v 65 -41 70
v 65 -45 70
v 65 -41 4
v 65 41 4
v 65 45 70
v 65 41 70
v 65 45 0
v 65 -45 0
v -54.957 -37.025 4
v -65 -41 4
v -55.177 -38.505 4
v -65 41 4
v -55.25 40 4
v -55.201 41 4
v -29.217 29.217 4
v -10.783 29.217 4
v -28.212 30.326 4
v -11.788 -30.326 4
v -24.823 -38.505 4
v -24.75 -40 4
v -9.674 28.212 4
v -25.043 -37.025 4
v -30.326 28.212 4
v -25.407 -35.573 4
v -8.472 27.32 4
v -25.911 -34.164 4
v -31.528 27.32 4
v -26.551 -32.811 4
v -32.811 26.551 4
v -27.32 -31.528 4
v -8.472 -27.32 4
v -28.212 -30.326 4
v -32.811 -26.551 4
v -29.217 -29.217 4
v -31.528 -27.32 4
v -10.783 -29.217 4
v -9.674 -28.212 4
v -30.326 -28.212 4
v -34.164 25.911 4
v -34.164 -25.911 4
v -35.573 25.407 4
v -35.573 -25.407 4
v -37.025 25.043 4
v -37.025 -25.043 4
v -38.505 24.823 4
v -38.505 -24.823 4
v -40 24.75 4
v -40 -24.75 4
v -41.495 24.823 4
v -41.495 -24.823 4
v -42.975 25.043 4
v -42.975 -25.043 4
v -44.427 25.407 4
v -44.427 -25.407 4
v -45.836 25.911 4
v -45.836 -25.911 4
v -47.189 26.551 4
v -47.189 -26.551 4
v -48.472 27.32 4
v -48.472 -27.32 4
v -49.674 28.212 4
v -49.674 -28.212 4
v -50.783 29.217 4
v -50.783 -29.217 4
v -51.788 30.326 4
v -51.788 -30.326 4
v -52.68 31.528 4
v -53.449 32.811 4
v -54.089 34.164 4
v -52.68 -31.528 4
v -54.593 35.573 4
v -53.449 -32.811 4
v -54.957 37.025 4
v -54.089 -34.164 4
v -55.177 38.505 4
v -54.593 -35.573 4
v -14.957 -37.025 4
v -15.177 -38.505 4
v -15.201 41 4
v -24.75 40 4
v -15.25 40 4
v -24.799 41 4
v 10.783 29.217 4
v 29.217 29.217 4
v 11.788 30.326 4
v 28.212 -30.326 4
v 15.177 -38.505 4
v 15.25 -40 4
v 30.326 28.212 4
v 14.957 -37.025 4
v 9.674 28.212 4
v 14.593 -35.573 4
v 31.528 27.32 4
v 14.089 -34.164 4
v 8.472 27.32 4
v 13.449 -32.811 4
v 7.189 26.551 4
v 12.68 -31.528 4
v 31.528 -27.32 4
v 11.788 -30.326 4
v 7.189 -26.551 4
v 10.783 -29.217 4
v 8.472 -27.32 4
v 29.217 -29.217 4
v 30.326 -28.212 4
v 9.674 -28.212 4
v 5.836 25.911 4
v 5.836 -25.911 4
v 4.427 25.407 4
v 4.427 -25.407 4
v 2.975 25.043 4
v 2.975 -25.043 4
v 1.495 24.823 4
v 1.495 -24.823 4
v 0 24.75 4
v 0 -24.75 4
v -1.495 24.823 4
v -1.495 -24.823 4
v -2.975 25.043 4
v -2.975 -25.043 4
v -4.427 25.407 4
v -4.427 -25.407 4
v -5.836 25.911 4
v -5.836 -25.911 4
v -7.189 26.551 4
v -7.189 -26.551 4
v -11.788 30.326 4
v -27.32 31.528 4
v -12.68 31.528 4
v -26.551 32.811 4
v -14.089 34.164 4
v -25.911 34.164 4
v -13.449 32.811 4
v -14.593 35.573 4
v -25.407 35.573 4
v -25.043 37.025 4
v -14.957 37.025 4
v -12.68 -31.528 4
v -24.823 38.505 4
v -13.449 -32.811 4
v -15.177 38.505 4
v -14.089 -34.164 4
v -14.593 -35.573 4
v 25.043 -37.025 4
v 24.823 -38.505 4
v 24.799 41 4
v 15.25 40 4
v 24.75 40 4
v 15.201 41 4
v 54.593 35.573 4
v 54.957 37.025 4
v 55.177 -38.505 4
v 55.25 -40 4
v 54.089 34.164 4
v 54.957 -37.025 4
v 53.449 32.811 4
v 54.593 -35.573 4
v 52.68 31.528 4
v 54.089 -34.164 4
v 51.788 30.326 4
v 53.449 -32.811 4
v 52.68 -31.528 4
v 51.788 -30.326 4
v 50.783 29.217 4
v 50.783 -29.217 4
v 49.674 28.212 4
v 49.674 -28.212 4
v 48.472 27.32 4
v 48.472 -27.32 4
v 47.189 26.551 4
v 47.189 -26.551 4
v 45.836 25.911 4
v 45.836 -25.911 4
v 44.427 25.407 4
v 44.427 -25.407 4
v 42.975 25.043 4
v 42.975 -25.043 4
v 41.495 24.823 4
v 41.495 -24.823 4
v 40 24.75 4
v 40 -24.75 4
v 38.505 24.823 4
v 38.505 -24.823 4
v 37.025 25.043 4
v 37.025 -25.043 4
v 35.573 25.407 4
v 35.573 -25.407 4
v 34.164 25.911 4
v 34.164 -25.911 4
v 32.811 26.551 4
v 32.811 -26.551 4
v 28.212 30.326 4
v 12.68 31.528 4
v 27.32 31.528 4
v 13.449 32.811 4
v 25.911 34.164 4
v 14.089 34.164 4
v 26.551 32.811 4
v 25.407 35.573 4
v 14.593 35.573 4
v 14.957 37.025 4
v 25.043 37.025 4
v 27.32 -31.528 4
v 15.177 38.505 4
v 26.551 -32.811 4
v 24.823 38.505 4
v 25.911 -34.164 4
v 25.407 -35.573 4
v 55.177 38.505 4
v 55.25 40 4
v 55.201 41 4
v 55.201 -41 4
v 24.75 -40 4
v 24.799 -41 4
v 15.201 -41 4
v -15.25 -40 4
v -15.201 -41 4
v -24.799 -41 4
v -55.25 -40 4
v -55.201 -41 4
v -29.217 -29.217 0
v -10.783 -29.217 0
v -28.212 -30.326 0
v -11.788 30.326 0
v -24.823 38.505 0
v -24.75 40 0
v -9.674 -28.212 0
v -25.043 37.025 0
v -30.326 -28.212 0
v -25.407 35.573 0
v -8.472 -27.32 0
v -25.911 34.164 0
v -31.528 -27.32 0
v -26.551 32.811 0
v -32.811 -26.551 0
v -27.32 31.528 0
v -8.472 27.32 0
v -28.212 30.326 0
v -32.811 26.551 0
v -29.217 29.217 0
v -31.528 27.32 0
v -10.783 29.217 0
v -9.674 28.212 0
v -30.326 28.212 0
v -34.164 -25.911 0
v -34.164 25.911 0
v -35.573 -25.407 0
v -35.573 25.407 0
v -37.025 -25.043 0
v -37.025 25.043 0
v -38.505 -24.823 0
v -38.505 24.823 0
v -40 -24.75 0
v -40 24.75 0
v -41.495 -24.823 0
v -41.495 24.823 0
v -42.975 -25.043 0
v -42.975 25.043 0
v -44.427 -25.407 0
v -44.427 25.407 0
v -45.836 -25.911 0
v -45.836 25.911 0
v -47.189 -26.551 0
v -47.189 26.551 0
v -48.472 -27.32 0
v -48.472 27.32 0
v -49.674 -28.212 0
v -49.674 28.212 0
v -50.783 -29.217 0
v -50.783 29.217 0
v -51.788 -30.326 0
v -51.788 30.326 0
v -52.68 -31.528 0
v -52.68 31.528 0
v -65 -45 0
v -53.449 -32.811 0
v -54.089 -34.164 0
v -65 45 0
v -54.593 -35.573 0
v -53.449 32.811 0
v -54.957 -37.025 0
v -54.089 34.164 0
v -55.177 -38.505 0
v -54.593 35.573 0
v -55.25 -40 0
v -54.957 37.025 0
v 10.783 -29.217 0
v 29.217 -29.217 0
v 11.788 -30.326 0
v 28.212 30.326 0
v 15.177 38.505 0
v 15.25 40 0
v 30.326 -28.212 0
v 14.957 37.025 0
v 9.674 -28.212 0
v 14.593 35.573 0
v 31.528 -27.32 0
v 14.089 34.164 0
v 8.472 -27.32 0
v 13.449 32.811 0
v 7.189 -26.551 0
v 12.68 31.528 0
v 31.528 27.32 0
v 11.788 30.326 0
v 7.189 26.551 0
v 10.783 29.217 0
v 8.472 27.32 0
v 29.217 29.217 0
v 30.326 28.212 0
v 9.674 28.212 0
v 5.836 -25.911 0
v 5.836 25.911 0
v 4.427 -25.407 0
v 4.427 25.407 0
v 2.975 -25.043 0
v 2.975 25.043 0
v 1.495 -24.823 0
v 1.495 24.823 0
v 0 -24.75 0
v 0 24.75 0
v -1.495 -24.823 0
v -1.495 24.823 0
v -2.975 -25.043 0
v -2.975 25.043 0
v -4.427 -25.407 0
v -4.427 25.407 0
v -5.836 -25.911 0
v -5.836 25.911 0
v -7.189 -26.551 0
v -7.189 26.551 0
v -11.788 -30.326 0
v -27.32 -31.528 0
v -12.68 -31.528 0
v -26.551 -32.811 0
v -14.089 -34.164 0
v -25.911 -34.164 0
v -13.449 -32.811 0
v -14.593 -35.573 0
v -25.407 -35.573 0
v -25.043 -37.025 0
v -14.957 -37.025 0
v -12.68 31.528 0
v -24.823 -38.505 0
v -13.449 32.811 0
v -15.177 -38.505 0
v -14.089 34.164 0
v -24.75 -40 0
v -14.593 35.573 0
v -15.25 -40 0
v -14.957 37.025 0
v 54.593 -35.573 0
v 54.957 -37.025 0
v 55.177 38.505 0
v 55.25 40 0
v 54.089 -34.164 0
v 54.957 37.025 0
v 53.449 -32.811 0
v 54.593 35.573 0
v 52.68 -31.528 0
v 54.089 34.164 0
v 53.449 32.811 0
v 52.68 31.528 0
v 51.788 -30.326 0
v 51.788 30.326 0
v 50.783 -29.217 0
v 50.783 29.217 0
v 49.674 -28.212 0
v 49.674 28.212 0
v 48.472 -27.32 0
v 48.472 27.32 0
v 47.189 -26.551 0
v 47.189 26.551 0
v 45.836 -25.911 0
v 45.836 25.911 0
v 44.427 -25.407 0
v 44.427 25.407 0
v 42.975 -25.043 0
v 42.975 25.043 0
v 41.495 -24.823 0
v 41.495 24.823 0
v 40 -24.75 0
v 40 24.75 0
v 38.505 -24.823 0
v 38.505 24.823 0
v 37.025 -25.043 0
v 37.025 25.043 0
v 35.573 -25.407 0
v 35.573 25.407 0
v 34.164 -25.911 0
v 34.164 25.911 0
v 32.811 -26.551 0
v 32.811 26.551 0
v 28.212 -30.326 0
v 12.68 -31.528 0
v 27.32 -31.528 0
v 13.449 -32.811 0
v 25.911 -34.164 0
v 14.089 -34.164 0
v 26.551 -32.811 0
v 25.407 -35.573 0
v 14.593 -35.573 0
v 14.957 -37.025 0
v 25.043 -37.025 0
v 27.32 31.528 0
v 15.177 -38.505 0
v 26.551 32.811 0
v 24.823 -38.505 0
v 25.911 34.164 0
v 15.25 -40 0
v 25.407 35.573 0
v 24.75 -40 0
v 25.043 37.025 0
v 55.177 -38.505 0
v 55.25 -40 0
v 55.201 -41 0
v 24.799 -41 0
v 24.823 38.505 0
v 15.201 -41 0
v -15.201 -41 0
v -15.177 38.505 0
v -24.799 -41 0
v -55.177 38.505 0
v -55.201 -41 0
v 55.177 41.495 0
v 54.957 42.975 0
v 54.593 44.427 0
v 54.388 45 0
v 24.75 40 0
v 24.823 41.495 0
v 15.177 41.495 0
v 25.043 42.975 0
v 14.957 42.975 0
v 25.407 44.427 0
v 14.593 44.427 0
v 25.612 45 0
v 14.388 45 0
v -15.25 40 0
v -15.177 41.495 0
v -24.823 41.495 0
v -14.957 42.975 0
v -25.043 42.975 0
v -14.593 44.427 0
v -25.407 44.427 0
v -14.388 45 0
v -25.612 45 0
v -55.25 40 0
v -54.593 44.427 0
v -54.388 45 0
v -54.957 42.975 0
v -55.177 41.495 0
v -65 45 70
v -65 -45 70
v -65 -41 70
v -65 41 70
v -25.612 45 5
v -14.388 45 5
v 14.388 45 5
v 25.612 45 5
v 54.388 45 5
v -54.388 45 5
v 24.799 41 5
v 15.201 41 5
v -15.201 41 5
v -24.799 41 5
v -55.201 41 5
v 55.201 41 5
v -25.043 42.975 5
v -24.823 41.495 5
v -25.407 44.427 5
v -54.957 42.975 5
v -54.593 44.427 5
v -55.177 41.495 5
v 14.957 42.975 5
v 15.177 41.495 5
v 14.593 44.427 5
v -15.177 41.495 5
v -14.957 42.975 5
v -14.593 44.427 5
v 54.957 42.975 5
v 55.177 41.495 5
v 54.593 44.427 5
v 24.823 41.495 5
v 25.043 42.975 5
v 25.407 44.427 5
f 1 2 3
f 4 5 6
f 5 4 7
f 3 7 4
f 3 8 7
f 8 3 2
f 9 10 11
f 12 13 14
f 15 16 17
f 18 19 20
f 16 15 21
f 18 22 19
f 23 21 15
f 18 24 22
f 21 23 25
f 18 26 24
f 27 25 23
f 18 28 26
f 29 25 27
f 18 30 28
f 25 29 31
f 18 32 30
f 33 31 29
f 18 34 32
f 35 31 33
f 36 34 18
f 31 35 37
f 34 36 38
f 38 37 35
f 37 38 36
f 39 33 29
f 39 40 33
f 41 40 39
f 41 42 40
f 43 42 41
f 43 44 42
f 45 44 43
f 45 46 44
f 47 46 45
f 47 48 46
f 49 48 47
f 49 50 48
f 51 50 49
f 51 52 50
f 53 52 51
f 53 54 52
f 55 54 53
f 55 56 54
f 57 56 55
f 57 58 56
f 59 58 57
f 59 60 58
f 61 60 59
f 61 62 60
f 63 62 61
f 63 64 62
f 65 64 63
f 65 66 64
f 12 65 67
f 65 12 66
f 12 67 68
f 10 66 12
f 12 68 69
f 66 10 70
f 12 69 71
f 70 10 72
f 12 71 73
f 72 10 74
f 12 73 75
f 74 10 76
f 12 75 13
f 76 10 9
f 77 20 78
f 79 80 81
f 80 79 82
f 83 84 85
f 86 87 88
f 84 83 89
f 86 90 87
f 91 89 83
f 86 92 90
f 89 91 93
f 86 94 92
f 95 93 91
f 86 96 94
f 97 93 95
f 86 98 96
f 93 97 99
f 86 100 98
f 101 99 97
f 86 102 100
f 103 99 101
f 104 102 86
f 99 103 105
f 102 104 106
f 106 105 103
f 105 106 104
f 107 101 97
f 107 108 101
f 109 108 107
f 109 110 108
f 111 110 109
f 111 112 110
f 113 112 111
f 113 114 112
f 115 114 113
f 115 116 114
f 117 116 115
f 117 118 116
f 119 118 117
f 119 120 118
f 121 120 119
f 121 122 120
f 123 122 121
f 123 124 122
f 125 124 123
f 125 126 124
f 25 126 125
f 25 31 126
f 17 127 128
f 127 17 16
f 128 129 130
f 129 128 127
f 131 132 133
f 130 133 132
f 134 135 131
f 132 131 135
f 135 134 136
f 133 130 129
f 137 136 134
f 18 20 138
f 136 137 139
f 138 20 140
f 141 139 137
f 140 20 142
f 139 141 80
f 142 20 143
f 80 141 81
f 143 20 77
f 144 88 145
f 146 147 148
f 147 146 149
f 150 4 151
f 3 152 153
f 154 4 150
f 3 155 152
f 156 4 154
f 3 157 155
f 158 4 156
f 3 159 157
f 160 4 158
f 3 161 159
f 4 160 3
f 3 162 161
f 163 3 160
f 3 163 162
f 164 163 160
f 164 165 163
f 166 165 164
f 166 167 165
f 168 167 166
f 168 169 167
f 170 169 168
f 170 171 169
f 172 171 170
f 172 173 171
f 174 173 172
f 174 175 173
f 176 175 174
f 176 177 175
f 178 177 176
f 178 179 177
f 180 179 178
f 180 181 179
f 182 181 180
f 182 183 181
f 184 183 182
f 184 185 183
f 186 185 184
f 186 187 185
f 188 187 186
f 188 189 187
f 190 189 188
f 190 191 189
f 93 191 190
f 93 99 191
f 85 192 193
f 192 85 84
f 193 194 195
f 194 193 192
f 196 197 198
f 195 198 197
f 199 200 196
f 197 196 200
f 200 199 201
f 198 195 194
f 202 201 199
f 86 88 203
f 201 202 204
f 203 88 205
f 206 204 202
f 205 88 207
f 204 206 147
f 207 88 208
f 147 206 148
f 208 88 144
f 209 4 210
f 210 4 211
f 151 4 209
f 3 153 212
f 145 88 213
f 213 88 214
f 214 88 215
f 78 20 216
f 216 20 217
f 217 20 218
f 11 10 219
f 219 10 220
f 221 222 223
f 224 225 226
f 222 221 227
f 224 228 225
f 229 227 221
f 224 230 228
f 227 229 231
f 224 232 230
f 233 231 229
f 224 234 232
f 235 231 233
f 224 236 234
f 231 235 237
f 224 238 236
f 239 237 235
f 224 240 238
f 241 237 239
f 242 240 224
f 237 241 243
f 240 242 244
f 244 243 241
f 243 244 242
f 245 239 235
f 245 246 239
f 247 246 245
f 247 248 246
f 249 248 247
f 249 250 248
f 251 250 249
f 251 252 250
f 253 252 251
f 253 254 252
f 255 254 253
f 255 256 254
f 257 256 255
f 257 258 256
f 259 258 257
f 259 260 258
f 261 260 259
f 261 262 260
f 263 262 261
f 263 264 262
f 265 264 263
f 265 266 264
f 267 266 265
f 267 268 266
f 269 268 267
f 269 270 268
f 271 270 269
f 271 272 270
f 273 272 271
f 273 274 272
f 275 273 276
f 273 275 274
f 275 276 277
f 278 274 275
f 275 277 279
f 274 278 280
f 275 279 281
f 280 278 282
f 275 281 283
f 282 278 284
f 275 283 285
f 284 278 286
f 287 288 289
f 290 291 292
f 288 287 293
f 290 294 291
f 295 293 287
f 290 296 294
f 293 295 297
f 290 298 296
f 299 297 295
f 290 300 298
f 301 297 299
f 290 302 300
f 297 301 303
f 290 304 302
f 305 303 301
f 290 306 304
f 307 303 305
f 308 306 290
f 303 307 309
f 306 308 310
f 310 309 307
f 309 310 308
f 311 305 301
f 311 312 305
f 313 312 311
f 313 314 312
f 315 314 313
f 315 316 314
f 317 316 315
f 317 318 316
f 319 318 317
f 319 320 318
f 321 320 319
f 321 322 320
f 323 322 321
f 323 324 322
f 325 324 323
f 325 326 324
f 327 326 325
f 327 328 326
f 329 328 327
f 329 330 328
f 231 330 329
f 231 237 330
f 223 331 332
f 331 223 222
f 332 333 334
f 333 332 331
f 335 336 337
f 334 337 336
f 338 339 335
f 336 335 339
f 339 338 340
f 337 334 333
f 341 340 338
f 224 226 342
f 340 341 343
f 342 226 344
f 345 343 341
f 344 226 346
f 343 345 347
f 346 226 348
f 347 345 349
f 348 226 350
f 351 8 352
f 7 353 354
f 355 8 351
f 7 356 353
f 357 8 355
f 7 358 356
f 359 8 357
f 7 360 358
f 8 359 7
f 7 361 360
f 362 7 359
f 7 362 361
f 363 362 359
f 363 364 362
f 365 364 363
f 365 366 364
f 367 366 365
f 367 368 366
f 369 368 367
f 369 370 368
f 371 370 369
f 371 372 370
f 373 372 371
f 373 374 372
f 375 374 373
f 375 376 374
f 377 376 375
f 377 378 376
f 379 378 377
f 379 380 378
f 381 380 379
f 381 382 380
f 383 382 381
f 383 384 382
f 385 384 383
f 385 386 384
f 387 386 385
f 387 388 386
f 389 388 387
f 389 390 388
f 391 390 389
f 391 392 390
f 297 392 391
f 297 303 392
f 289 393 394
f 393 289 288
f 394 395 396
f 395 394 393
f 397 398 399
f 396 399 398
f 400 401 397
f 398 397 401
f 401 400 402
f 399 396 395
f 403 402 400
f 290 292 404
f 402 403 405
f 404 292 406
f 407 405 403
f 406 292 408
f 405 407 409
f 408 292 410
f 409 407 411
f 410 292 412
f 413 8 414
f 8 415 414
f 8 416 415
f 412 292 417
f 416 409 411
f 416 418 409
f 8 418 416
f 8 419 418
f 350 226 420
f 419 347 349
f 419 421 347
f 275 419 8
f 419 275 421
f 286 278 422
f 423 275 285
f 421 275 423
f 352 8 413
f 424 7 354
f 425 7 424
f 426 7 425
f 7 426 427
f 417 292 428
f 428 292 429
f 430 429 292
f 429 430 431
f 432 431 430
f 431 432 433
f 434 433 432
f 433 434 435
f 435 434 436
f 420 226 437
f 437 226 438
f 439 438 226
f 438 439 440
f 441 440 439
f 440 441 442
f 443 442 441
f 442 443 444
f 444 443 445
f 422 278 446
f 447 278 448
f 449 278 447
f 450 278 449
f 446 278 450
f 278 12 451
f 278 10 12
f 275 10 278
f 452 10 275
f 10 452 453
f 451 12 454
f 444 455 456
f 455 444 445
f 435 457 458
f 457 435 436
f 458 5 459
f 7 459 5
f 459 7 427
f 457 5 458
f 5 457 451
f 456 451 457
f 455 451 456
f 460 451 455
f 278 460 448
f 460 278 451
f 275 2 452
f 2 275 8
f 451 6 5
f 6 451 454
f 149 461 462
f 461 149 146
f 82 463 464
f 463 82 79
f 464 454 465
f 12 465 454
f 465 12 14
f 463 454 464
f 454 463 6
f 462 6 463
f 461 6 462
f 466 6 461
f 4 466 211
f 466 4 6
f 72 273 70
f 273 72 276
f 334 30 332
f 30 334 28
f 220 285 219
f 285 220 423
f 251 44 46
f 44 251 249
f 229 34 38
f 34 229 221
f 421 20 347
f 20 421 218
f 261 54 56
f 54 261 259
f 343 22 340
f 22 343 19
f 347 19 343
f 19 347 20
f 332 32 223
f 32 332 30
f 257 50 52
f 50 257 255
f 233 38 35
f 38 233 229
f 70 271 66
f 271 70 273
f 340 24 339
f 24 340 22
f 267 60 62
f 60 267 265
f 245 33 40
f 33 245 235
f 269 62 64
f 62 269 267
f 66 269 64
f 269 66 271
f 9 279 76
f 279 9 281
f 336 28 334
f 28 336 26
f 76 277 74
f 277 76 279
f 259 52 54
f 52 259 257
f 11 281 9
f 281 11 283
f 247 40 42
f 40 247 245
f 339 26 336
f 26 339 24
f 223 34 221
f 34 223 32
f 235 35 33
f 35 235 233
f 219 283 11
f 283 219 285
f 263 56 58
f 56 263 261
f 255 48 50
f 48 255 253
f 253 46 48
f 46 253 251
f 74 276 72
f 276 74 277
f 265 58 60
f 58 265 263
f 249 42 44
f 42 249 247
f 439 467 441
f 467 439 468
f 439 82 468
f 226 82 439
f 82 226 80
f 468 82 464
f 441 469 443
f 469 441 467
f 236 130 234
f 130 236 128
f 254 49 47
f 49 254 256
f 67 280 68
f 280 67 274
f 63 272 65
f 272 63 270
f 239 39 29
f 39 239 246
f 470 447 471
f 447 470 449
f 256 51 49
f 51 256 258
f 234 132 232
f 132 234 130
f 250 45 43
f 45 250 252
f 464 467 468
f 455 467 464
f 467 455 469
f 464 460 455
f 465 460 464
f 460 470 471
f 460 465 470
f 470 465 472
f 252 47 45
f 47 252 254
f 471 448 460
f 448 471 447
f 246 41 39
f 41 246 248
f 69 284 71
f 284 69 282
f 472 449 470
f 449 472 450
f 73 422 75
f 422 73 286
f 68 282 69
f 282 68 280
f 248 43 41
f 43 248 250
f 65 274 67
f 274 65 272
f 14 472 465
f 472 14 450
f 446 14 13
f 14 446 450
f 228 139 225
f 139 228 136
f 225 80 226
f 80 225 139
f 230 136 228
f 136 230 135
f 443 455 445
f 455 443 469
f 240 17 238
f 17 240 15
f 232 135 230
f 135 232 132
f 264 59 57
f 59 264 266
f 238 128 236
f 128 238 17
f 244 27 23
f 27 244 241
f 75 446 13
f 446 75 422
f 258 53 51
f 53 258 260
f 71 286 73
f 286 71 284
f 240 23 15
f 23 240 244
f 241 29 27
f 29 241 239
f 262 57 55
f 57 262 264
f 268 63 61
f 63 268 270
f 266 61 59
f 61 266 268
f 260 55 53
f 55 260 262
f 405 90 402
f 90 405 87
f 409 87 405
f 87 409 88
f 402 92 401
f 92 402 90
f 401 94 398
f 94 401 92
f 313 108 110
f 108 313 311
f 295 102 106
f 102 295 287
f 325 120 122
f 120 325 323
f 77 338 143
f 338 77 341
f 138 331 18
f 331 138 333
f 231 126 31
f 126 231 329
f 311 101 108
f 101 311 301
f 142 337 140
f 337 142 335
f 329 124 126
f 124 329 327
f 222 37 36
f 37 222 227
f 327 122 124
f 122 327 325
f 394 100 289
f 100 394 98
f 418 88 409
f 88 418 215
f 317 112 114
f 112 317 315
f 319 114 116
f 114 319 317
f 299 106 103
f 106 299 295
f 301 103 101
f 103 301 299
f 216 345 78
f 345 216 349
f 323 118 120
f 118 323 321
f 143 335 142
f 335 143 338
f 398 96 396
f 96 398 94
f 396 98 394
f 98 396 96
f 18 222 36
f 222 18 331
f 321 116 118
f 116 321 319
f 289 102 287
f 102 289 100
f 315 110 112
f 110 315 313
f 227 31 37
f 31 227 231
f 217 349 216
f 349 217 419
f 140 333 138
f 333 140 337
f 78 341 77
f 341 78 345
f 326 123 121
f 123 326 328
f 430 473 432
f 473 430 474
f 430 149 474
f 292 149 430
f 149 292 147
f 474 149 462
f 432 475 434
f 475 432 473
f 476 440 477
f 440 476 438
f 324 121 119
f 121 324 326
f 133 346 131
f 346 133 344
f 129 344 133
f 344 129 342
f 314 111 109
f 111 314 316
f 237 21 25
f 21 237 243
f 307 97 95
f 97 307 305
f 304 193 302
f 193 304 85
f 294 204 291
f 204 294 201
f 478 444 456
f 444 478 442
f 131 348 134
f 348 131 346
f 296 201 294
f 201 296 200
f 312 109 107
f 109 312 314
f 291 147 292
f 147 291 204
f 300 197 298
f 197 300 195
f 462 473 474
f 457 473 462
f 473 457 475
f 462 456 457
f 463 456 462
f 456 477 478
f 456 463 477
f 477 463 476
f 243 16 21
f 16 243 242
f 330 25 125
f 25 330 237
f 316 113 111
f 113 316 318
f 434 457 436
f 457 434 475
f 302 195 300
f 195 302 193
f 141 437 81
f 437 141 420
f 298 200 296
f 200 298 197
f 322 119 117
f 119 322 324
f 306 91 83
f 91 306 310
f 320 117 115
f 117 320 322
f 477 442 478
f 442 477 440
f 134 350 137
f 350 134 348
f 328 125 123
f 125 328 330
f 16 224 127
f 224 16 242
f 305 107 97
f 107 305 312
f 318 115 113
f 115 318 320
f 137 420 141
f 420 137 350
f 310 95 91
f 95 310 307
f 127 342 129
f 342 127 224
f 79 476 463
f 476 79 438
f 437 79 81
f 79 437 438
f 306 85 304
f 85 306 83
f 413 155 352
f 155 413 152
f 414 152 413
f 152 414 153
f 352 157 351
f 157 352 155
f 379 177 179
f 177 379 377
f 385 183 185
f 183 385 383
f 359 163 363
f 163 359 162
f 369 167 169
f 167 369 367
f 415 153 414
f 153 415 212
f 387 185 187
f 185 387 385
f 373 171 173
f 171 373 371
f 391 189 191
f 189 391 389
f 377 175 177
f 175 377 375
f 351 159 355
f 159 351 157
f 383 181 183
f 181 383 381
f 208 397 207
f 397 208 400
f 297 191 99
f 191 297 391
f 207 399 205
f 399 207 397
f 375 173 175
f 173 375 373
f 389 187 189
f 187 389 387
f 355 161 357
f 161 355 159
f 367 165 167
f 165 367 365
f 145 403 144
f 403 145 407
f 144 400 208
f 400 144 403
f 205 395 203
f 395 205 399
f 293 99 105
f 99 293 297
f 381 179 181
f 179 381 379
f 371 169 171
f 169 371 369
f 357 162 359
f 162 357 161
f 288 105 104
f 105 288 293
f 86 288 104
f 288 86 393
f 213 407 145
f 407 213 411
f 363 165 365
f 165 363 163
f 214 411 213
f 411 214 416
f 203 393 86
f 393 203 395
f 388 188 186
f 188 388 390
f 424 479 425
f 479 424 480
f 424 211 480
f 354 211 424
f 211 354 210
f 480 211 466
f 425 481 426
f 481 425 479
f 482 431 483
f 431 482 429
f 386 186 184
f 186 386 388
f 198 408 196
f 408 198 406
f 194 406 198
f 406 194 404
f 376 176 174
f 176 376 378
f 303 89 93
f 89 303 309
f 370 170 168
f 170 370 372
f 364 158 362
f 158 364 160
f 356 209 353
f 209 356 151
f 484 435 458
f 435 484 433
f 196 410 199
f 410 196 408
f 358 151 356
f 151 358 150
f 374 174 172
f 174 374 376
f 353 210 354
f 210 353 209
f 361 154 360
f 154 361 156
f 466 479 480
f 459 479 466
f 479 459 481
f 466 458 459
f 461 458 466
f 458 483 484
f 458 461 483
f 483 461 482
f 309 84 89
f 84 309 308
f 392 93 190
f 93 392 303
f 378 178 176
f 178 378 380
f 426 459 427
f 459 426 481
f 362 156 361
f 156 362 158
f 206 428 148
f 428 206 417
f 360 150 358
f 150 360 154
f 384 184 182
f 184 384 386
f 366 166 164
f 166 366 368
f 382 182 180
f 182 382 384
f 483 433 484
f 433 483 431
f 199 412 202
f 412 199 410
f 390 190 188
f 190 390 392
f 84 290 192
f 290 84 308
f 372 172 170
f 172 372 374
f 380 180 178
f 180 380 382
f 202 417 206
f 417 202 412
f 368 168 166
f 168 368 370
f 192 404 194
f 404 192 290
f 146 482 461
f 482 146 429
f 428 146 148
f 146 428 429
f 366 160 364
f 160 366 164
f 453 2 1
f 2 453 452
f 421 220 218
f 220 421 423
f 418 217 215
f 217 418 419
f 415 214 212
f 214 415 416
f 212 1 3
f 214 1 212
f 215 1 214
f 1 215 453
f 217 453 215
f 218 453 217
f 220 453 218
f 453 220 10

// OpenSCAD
// 50 mL conical tube rack – printed upside-down, then flipped.
// Print orientation: flat plate on the bed (z = 0..4), walls rising +Z.
// After flipping: rack stands on the two walls; tubes pass through the holes.

// ---- Plate ----
plate_x = 130;   // plate length along X (mm)
plate_y = 90;    // plate width  along Y (mm)
plate_t = 4;     // plate thickness (mm)

// ---- Tube holes ----
hole_d  = 30.5;  // through-hole diameter (mm)
hole_r  = hole_d / 2;
pitch   = 40;    // centre-to-centre spacing in both X and Y (mm)

// ---- Side walls (run along the two long edges, i.e. along X) ----
wall_len  = 130; // wall length along X (mm)
wall_thk  = 4;   // wall thickness along Y (mm)
wall_h    = 70;  // wall height above z = 0 (mm)

$fn = 64;

// ------------------------------------------------------------------
// Base plate, centred on the origin in X and Y, sitting on z = 0.
// ------------------------------------------------------------------
module plate() { translate([-plate_x/2, -plate_y/2, 0])
        cube([plate_x, plate_y, plate_t]); }

// ------------------------------------------------------------------
// Six through-holes: 2 rows (Y) x 3 columns (X), 40 mm pitch, centred.
// Cylinders extend 1 mm past each face of the 4 mm plate (z = -1..5)
// so no cut face is exactly coplanar with the plate faces.
// ------------------------------------------------------------------
module holes() { for (i = [-1, 0, 1], j = [-1, 1])
    translate([i * pitch, j * pitch, -1])
        cylinder(h = plate_t + 2, r = hole_r, $fn = $fn); }

// ------------------------------------------------------------------
// Two solid walls along the long edges, flush with the plate edges.
// Each wall: 130 (X) x 4 (Y) x 70 (Z), rising from z = 0 to z = 70.
// ------------------------------------------------------------------
module walls() { union()
    // wall on the +Y edge (flush with y = +plate_y/2)
    translate([-wall_len/2,  plate_y/2 - wall_thk, 0])
        cube([wall_len, wall_thk, wall_h]); }
    // wall on the -Y edge (flush with y = -plate_y/2)
    translate([-wall_len/2, -plate_y/2, 0])
        cube([wall_len, wall_thk, wall_h]);

// ------------------------------------------------------------------
// Final part: plate + walls, with the six through-holes subtracted.
// ------------------------------------------------------------------
difference() {
    union() {
        plate();
        walls();
    }
    holes();
}
